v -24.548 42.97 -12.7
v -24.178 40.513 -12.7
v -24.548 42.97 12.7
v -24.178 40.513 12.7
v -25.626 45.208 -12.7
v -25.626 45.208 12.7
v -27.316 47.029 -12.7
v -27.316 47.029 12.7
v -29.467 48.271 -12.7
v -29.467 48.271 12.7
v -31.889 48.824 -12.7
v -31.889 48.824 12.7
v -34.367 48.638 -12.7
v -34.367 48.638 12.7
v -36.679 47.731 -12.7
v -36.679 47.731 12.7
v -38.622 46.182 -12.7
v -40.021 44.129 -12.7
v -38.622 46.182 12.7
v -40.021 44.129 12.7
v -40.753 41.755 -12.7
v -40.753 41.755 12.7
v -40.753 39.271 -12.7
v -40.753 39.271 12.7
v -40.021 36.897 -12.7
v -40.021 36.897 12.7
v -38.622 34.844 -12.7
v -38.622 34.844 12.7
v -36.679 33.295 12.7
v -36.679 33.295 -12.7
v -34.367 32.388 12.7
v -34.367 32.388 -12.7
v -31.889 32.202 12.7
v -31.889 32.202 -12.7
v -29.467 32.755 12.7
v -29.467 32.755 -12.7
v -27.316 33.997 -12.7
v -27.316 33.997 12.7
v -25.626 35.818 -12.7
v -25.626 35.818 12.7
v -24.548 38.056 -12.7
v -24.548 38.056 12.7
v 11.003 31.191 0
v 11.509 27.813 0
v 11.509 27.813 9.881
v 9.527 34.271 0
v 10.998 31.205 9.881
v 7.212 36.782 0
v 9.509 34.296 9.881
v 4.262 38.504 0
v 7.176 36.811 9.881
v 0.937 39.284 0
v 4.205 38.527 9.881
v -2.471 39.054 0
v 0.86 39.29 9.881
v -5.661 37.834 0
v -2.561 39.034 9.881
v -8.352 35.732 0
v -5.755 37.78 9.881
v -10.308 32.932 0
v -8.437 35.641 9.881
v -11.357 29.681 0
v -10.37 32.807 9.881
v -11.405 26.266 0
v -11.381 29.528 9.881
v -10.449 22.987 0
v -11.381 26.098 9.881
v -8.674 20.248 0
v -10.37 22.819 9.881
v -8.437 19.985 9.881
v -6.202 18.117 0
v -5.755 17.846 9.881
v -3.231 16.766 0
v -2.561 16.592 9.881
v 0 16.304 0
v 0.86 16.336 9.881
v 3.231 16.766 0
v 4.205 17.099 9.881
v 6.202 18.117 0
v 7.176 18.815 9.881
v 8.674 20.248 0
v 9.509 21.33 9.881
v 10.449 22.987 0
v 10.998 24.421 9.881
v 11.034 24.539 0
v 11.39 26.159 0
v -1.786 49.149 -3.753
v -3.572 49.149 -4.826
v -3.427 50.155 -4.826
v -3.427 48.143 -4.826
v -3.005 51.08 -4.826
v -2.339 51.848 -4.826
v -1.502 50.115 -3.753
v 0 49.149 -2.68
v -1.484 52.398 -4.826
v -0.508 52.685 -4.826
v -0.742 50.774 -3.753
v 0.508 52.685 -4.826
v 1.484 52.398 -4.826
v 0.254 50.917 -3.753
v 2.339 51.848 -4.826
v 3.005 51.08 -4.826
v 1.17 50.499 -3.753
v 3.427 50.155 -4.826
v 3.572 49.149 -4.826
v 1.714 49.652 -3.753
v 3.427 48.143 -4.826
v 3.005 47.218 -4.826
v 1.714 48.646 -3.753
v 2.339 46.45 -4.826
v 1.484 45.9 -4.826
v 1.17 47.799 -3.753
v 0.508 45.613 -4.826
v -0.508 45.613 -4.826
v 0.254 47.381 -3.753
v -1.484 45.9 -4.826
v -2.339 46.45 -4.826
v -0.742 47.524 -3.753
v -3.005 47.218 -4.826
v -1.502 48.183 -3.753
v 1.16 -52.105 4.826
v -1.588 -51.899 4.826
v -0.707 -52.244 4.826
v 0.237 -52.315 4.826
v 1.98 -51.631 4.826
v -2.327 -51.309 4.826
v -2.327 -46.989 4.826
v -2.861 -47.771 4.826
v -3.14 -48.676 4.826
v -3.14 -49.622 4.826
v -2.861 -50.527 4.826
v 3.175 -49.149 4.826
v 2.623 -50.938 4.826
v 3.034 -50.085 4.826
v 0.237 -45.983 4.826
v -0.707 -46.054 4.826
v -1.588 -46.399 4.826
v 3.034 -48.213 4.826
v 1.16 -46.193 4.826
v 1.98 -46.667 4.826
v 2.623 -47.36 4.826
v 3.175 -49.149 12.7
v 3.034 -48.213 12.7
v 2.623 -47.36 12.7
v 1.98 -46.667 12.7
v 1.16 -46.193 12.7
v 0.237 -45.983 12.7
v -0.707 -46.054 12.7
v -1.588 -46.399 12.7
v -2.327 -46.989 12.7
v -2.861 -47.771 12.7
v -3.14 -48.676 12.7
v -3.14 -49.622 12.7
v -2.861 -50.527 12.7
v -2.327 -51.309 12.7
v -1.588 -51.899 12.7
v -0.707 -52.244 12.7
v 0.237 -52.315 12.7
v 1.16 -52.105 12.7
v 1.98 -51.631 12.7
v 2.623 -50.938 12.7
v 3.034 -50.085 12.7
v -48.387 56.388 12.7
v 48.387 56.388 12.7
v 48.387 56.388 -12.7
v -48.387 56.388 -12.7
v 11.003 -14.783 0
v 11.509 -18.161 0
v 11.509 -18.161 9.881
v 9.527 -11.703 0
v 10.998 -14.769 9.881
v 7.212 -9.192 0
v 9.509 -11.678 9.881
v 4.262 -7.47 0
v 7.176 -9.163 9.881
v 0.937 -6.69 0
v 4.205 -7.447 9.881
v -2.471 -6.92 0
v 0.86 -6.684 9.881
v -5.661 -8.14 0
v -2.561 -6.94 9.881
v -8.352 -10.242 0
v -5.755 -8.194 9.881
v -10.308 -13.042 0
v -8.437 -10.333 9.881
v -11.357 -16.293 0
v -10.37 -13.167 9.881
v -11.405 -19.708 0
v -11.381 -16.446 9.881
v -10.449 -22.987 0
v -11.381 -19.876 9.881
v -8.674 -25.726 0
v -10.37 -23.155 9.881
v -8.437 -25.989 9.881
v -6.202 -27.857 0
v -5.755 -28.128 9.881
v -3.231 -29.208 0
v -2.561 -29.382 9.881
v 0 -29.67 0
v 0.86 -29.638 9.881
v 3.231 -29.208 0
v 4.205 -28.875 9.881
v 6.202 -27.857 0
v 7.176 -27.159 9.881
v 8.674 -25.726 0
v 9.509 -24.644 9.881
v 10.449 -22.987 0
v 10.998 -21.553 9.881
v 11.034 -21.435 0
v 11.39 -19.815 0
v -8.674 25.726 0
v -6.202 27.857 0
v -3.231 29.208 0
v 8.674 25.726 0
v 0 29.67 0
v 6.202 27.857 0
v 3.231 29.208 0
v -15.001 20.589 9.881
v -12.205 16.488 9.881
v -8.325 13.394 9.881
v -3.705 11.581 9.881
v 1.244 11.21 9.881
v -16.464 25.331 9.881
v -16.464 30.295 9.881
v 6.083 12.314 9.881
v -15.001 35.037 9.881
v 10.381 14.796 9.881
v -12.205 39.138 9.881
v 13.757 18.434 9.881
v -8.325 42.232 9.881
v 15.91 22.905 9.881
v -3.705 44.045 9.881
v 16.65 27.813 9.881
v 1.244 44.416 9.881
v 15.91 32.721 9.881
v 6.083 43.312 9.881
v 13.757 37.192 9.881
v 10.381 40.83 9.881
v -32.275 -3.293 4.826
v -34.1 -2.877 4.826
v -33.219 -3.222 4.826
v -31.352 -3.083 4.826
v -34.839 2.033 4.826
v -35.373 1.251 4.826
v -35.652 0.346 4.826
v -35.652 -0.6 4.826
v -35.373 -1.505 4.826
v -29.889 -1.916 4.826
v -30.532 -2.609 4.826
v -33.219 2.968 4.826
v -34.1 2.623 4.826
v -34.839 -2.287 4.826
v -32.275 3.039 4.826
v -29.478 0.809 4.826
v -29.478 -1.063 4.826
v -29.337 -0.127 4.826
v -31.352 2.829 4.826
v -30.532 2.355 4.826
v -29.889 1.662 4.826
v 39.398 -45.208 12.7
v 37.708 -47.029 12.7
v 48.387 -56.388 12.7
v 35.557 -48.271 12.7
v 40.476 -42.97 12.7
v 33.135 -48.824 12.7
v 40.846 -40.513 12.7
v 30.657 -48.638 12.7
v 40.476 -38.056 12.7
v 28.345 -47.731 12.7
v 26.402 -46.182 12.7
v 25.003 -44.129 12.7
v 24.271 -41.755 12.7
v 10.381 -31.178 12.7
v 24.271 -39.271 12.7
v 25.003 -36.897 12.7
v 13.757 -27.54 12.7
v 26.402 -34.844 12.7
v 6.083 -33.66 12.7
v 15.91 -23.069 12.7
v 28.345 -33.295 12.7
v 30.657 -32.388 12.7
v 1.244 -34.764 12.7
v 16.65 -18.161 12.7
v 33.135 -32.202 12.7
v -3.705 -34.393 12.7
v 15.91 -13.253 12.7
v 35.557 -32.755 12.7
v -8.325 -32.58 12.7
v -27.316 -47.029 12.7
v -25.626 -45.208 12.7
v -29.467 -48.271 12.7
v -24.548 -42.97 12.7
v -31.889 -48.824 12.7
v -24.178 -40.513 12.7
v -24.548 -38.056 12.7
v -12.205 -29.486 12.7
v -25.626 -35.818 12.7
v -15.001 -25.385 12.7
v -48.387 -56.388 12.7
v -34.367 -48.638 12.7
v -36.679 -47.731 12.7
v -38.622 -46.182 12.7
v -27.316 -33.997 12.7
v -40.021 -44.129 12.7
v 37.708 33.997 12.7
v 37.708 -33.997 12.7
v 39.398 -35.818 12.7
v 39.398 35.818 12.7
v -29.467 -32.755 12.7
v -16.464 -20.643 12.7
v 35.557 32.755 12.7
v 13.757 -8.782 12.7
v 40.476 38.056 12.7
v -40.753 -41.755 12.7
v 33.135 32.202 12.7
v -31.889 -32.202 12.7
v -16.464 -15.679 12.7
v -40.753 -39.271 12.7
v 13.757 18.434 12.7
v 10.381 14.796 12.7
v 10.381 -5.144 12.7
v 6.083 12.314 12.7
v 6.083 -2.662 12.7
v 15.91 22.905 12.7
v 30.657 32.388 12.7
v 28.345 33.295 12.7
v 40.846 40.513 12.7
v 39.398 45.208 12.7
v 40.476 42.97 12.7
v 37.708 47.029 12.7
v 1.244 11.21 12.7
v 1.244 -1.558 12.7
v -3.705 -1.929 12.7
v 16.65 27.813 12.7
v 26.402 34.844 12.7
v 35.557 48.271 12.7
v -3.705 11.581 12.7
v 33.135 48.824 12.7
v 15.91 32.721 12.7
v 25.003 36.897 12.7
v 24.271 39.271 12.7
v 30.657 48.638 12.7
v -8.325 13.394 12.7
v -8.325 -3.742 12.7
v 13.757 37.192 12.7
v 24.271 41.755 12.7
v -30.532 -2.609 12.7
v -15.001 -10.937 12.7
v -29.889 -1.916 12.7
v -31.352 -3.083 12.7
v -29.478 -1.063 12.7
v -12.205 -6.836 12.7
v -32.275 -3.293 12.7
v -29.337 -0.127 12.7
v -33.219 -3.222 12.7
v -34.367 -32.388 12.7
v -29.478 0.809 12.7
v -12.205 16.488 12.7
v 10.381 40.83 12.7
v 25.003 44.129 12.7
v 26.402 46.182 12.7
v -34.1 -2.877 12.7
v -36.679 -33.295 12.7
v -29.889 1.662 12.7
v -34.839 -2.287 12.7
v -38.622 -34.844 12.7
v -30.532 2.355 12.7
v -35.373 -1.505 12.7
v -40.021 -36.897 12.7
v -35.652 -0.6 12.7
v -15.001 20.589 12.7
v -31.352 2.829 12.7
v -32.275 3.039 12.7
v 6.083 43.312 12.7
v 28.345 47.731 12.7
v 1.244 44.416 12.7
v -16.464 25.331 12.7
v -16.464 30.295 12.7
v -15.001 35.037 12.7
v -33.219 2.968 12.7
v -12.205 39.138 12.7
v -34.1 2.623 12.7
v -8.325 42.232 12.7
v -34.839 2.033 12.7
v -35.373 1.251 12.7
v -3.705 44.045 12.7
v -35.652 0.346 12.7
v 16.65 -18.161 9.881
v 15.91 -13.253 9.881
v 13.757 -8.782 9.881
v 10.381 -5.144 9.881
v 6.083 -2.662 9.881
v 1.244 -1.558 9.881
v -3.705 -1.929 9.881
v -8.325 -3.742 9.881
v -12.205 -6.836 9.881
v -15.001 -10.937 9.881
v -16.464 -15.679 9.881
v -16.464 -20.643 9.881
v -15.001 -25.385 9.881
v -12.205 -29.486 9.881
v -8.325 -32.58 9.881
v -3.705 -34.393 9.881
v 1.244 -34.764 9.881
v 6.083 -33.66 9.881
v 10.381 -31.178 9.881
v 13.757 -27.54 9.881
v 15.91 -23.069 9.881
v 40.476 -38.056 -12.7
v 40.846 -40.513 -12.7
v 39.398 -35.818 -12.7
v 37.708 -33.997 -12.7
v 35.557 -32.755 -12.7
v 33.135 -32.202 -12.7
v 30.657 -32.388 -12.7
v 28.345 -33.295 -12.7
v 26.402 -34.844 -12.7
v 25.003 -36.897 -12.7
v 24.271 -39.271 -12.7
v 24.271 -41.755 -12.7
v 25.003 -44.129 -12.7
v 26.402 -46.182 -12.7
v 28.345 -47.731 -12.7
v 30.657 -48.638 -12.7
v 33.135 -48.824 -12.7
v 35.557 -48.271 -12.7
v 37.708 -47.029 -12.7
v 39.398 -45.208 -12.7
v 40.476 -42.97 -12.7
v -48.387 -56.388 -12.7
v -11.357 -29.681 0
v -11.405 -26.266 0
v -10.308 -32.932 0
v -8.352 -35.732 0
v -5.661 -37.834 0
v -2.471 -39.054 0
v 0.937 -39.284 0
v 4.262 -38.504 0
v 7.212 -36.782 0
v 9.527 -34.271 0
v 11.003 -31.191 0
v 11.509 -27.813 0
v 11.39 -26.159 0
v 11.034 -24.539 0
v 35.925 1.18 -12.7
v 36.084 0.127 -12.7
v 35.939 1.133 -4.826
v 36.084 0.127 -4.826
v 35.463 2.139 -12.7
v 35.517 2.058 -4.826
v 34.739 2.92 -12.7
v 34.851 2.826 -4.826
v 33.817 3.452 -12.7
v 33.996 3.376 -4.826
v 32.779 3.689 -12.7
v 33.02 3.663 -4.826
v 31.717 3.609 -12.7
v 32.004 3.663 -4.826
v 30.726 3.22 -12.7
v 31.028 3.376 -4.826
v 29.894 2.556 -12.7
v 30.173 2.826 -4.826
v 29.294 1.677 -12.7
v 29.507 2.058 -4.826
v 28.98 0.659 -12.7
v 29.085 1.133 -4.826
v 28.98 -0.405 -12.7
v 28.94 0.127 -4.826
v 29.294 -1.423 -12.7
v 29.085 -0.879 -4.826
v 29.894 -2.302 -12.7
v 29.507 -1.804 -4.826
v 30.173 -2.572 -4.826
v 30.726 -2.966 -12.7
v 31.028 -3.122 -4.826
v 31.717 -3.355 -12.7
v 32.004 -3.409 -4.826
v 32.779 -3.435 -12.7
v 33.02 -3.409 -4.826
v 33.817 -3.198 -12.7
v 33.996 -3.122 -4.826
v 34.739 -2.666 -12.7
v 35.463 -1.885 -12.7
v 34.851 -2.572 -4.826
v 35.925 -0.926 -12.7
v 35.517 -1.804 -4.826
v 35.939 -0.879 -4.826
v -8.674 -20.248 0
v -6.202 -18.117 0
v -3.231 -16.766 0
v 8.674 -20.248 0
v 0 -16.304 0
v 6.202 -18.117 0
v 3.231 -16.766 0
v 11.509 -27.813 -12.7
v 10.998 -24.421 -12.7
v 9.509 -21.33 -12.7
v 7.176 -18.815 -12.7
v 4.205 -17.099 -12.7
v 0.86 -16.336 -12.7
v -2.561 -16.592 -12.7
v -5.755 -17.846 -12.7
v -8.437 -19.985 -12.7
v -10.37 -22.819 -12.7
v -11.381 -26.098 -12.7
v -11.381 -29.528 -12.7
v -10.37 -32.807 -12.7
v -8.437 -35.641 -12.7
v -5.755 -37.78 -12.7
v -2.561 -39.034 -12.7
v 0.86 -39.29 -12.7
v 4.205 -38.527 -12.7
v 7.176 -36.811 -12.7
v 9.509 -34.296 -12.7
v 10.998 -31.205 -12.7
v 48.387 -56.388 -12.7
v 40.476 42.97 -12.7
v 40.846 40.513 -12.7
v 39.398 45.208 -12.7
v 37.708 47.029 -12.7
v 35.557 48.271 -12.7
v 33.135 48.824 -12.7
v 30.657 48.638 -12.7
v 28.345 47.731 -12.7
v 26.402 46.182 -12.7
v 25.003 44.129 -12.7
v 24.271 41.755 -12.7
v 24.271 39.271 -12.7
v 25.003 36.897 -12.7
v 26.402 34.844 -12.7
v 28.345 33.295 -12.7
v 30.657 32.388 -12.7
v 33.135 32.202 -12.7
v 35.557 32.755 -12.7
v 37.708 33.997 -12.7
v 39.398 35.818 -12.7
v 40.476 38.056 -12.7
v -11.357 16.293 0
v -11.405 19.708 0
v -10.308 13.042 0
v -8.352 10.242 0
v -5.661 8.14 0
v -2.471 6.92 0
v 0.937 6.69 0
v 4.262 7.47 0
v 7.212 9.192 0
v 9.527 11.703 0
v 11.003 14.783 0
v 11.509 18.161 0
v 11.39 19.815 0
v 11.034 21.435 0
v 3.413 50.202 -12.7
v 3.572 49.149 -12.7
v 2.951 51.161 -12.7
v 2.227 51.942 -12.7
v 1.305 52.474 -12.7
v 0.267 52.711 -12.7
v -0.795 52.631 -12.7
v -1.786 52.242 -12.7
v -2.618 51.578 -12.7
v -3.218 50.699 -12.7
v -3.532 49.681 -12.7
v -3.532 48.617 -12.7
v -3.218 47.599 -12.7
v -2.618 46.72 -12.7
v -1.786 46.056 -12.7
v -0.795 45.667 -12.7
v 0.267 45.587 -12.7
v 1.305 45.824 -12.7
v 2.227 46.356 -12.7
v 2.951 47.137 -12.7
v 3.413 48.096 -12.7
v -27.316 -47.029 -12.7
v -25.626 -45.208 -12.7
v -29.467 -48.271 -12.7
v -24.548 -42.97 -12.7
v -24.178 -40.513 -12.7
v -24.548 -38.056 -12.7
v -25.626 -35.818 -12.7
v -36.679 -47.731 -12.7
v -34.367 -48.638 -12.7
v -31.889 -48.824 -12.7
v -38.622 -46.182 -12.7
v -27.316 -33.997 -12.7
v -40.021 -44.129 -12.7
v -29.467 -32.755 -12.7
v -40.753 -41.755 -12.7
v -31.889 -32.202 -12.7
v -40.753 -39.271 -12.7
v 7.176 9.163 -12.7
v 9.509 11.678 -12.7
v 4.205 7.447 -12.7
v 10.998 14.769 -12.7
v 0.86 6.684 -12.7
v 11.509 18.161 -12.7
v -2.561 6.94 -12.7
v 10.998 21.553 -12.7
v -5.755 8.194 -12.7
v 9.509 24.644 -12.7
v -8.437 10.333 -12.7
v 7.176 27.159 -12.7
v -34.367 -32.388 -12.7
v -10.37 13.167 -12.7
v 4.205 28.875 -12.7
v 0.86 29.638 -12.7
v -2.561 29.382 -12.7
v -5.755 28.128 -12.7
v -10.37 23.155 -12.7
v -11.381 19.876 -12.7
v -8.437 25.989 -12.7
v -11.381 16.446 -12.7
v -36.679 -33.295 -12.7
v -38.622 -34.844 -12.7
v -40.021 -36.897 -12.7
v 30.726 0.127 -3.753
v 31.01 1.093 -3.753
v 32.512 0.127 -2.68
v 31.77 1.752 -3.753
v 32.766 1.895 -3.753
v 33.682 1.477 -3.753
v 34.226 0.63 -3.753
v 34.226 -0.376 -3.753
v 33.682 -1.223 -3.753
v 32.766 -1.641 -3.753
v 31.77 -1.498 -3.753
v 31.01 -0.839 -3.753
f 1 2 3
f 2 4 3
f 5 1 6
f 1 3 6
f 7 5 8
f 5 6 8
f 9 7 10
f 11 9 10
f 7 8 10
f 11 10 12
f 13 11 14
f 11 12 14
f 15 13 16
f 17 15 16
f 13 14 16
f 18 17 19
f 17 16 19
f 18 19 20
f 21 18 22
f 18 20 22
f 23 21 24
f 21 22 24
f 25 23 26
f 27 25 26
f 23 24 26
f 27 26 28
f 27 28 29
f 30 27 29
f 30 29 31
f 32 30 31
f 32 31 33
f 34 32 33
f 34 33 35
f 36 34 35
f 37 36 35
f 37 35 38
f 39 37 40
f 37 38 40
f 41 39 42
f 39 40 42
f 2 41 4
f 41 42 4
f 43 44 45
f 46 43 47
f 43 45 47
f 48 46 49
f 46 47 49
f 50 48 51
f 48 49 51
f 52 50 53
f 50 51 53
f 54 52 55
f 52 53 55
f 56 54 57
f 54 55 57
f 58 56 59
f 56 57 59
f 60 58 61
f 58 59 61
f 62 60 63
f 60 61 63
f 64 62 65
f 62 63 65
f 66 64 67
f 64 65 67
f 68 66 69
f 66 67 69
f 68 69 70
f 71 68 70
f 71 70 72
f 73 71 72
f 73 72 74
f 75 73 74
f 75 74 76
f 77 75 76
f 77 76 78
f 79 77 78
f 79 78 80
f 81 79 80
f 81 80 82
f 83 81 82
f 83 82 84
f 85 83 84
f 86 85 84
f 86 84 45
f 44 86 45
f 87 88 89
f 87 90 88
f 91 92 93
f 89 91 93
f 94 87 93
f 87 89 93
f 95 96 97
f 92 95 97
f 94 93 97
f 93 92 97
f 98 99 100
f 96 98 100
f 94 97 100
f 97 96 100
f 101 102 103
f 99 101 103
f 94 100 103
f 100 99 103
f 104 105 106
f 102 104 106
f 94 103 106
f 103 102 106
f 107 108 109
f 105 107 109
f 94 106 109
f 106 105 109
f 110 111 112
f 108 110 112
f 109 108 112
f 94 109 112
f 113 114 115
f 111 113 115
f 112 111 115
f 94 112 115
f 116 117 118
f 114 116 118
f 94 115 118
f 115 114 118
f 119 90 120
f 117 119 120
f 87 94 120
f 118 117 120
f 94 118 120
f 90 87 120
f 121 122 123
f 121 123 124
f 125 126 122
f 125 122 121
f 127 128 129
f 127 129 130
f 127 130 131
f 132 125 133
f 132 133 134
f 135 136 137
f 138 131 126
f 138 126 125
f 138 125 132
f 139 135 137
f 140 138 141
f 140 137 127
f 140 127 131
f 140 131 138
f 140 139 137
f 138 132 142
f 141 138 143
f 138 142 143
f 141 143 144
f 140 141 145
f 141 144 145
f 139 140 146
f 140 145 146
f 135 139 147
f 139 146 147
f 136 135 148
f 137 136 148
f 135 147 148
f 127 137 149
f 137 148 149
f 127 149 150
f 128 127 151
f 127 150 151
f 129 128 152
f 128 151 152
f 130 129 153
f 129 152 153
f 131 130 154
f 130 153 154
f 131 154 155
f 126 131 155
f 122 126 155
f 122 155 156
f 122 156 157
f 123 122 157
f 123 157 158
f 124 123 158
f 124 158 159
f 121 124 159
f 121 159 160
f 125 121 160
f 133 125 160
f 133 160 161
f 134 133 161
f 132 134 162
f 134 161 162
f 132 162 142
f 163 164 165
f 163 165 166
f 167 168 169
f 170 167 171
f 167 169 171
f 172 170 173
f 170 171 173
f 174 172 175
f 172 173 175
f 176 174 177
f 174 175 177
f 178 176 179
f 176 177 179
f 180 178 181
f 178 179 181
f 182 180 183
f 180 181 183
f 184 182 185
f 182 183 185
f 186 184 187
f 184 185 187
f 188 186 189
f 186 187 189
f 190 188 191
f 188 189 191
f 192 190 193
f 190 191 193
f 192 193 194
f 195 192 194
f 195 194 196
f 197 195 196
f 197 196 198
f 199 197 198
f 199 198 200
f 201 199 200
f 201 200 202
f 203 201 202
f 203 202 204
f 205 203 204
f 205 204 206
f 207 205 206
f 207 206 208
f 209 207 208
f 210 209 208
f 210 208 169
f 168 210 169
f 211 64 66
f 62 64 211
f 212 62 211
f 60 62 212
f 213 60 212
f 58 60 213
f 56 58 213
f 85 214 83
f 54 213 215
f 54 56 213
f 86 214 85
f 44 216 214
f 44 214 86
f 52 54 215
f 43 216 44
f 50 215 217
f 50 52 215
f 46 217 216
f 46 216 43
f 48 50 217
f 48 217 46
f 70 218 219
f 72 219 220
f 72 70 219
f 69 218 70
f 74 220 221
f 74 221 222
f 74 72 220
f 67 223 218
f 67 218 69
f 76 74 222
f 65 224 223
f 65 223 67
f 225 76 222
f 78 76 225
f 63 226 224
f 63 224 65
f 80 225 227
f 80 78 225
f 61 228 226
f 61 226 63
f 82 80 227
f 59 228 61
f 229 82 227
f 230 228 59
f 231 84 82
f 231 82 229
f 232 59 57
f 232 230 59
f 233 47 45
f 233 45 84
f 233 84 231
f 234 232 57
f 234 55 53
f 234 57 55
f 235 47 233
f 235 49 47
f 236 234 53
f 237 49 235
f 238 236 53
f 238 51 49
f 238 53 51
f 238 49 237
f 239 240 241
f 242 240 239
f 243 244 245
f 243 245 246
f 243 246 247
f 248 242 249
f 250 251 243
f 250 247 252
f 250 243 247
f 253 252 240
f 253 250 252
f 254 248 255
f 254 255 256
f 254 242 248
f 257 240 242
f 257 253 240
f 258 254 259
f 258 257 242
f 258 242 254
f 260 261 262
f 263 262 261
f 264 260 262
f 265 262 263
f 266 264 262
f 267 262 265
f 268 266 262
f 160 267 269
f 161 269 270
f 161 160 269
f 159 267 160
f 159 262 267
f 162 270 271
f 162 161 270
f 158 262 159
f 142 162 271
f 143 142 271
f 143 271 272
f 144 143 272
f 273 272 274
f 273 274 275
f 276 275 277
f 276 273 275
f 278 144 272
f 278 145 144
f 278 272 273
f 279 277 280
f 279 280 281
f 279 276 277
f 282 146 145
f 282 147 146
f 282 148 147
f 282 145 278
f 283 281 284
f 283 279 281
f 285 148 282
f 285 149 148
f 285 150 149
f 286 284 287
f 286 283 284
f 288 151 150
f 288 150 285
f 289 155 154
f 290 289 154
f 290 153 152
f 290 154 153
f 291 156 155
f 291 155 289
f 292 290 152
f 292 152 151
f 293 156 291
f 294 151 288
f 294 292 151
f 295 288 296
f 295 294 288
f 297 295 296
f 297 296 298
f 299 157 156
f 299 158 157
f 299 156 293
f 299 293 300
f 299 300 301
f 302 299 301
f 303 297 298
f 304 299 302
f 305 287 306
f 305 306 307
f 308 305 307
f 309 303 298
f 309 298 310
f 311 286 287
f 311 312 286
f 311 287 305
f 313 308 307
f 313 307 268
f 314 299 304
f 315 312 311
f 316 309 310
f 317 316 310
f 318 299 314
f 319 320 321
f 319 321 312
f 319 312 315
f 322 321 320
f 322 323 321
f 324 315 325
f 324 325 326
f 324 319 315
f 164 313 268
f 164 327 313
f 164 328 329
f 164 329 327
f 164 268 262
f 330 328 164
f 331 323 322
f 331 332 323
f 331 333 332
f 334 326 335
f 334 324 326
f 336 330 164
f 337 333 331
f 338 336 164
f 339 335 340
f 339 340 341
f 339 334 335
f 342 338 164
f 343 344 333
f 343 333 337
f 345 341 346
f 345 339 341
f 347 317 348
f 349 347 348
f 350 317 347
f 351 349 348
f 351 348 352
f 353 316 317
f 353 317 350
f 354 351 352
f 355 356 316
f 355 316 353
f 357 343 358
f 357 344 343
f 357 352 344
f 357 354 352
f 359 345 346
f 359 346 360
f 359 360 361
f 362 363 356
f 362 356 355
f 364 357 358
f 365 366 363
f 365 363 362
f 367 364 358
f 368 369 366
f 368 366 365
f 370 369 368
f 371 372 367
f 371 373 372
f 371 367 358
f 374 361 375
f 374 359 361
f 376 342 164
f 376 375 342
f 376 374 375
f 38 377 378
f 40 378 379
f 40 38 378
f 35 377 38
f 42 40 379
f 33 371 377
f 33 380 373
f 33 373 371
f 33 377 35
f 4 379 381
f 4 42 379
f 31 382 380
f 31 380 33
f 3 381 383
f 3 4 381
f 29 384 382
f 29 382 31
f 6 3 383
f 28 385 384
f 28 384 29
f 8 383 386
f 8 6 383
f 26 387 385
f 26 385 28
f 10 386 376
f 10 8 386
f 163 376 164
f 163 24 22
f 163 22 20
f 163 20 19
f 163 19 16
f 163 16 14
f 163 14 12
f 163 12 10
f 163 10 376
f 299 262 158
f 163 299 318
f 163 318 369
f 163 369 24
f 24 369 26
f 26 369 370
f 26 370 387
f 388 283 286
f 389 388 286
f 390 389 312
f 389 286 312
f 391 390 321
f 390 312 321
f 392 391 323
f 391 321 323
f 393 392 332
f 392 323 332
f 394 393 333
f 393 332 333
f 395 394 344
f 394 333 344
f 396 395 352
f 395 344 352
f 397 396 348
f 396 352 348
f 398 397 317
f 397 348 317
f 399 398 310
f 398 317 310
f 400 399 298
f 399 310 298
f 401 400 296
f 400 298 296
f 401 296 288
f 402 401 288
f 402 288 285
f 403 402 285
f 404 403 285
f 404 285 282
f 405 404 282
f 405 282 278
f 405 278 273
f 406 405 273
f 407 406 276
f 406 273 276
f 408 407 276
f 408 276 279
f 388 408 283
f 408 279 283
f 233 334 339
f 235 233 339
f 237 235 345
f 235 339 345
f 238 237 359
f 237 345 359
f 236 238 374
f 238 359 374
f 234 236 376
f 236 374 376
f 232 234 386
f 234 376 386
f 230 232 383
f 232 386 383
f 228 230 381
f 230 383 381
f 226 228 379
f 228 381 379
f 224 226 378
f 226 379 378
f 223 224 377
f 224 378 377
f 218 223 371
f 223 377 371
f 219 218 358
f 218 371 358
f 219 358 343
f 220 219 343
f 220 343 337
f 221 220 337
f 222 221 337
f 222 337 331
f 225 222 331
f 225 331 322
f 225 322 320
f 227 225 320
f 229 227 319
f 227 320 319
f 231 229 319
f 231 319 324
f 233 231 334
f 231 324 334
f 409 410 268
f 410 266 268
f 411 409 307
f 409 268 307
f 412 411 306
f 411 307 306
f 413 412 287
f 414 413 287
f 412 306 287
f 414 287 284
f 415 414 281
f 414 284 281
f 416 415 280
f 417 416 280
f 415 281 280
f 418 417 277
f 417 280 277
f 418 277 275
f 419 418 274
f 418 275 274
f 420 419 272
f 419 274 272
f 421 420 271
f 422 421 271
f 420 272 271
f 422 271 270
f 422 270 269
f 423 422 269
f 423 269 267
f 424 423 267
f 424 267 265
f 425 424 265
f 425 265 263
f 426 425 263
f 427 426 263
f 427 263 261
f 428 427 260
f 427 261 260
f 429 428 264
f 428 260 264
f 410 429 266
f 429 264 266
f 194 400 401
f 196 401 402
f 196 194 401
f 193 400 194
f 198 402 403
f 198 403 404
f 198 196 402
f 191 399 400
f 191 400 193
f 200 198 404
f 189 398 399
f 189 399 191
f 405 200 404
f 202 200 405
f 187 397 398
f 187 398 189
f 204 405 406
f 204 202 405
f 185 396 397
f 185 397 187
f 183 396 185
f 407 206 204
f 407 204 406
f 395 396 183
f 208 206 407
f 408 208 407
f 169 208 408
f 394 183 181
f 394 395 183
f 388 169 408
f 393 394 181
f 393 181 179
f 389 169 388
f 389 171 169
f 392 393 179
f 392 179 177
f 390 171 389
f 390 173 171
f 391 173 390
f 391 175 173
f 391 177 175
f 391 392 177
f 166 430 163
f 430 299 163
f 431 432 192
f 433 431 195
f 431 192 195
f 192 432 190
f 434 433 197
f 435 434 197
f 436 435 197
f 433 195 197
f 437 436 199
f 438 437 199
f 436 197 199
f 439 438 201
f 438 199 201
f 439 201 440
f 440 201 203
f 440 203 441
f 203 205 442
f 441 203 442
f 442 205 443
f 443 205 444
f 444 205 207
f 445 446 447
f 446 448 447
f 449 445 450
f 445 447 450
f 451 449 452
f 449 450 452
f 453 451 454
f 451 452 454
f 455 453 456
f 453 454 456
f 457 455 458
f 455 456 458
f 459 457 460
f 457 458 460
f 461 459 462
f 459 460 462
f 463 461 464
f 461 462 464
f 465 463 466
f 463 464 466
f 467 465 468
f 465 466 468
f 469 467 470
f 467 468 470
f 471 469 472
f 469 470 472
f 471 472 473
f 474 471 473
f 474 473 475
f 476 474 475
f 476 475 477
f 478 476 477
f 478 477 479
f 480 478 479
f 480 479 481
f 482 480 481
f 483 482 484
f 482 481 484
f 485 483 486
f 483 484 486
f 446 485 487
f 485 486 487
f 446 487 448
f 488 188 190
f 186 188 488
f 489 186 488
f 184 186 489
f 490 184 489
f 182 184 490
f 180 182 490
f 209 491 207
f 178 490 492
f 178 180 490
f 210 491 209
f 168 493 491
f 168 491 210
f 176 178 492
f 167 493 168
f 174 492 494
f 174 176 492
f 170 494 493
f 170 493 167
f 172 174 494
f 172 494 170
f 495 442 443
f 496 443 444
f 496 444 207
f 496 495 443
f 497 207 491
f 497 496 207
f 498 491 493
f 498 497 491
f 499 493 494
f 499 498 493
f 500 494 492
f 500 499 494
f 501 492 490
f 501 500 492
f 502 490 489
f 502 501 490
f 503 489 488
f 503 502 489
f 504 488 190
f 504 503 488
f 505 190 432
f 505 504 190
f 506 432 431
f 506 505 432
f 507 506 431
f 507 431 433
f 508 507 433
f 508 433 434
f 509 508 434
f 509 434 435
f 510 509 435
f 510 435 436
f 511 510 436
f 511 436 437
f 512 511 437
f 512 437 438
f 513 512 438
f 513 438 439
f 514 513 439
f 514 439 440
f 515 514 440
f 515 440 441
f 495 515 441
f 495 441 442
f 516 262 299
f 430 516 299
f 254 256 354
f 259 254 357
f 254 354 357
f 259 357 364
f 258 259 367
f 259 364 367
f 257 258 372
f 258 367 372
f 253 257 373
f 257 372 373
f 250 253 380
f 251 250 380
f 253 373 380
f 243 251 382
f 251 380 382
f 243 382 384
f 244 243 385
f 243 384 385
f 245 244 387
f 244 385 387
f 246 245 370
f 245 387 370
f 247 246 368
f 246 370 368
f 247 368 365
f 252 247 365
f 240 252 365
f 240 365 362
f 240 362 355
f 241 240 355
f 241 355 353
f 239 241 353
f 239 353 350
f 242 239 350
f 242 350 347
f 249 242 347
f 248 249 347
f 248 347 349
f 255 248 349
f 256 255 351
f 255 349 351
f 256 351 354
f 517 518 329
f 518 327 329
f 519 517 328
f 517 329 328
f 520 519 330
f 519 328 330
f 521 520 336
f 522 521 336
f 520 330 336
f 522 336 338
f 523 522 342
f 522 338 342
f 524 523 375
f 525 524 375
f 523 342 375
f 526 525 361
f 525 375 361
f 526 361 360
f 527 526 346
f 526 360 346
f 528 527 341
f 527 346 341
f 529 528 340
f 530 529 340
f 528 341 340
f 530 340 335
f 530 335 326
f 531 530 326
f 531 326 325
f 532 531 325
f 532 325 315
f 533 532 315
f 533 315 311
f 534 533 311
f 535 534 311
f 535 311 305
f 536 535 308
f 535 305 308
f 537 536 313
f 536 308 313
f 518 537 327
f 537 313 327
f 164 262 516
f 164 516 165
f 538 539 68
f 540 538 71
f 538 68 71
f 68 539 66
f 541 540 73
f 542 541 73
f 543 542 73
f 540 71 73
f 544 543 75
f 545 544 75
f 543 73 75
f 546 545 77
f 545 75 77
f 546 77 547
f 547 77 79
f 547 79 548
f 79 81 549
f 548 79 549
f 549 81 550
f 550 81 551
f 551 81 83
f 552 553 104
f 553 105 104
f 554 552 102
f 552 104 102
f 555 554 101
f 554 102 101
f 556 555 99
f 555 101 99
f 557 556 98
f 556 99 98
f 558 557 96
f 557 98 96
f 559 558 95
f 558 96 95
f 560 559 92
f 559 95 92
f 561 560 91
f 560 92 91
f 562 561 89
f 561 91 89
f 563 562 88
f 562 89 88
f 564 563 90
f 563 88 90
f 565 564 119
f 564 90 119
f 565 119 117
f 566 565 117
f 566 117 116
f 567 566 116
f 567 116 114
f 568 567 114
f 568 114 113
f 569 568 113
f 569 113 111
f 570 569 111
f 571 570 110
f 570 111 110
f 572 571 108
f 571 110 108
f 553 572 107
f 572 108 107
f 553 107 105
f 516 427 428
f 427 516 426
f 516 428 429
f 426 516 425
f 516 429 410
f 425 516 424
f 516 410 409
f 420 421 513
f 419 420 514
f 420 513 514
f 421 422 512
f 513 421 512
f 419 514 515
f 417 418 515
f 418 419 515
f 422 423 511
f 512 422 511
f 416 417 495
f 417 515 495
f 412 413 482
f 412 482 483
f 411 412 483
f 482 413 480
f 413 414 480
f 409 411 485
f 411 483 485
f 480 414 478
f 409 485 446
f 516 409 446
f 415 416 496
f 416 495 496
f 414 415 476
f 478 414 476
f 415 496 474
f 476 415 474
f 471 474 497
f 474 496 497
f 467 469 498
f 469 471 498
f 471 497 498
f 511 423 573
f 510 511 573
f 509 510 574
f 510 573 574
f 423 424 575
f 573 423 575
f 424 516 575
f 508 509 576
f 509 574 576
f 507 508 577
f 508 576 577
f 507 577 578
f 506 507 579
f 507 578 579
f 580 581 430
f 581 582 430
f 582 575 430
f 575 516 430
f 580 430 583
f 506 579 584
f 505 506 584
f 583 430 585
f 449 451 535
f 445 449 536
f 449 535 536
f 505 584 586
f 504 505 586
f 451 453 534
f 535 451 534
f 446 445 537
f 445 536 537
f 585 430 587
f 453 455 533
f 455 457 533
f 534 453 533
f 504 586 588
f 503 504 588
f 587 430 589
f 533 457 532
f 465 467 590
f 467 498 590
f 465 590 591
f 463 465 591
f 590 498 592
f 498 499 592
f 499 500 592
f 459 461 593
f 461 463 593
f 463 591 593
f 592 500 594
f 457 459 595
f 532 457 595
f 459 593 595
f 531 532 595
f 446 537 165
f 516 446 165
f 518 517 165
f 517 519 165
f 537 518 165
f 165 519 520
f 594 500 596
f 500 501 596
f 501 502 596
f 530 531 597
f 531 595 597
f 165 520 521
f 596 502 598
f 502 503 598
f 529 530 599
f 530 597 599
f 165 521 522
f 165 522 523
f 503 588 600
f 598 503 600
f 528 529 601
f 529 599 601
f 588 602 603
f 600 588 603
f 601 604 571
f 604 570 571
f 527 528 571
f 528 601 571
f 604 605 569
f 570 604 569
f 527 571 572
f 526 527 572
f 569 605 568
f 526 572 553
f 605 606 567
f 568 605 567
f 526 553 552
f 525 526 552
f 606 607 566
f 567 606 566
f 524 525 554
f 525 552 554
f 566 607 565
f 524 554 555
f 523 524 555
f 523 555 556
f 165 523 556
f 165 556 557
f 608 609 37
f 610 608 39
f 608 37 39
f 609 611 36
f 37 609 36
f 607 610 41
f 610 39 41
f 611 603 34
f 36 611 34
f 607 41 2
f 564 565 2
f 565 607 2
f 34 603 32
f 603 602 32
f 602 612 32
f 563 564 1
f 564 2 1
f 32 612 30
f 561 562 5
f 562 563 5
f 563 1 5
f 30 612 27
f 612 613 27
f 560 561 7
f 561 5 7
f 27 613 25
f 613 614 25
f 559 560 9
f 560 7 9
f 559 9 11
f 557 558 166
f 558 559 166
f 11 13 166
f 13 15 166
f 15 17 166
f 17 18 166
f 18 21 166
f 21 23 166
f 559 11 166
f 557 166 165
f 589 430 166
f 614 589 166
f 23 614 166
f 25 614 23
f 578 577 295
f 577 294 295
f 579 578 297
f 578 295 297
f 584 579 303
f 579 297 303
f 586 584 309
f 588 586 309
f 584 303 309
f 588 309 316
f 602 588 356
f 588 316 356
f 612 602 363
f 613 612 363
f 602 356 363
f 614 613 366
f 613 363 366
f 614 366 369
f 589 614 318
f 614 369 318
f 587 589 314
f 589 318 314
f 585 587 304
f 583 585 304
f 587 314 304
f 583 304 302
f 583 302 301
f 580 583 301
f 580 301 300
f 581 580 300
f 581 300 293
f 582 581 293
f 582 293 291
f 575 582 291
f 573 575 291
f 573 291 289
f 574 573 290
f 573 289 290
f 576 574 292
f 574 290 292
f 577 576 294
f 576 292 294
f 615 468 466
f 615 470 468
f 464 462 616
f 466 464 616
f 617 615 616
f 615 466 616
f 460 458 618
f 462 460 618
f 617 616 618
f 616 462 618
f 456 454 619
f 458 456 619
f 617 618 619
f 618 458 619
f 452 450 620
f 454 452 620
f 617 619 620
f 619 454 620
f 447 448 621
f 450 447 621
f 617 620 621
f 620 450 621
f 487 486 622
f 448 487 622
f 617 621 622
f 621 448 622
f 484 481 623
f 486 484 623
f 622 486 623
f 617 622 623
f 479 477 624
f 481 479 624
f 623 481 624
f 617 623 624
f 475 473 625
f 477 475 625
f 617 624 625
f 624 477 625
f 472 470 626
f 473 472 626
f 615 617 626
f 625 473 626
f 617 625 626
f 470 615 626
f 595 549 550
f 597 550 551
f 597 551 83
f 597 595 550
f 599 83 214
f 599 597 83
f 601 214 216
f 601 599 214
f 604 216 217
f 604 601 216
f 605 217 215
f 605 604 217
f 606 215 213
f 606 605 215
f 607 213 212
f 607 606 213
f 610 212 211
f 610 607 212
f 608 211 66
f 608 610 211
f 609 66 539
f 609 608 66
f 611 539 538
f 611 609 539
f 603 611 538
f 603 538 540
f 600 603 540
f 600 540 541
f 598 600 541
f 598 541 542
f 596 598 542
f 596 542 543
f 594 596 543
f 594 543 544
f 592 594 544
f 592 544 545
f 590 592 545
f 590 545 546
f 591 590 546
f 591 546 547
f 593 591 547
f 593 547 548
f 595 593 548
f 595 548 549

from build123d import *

# Parameters (mm, degrees)
SKETCH1_W                   = 112.776
SKETCH1_H                   = 96.774
BOSS_EXTRUDE1_DEPTH         = 12.7
F_5_8_CLEARANCE_HOLE1_D     = 16.66875
F_5_8_CLEARANCE_HOLE1_DEPTH = 25.4
F_5_8_CLEARANCE_HOLE1_TIP   = 5.007797722
CUT_EXTRUDE2_START          = -12.7
SKETCH4_R                   = 11.509375
CUT_EXTRUDE2_DEPTH          = 12.7
CUT_EXTRUDE4_START          = 12.7
SKETCH5_R                   = 11.509375
CUT_EXTRUDE4_DEPTH          = 12.7
CUT_EXTRUDE6_START          = 12.7
SKETCH6_R                   = 16.6497
CUT_EXTRUDE6_DEPTH          = 2.8194
F_1_4_CLEARANCE_HOLE2_D     = 7.14375
F_1_4_CLEARANCE_HOLE2_DEPTH = 7.874
F_1_4_CLEARANCE_HOLE2_TIP   = 2.146199024
CUT_EXTRUDE8_START          = 12.7
SKETCH11_R                  = 3.175
CUT_EXTRUDE8_DEPTH          = 7.874


with BuildPart() as part:
    # Sketch1 → Boss-Extrude1 (new, symmetric)
    with BuildSketch(Plane(origin=(0, 0, 0), x_dir=(0, 1, 0), z_dir=(0, 0, 1))):
        Rectangle(SKETCH1_W, SKETCH1_H)
    extrude(amount=BOSS_EXTRUDE1_DEPTH, both=True)

    # 5/8 Clearance Hole1
    with Locations(Plane(origin=(0, 0, -12.7), x_dir=(-1, 0, 0), z_dir=(0, 0, -1))):
        with Locations((-32.512, -40.513), (-32.512, 40.513), (32.512, -40.513), (32.512, 40.513)):
            Hole(F_5_8_CLEARANCE_HOLE1_D / 2, depth=F_5_8_CLEARANCE_HOLE1_DEPTH)
            with Locations((0, 0, -(F_5_8_CLEARANCE_HOLE1_DEPTH + F_5_8_CLEARANCE_HOLE1_TIP / 2))):  # 118° drill point
                Cone(0, F_5_8_CLEARANCE_HOLE1_D / 2, F_5_8_CLEARANCE_HOLE1_TIP, mode=Mode.SUBTRACT)

    # Sketch4 → Cut-Extrude2 (cut)
    with BuildSketch(Plane(origin=(0, 0, 0), x_dir=(0, 1, 0), z_dir=(0, 0, 1)).offset(CUT_EXTRUDE2_START)):
        with Locations(Location((-27.813, 0, 0), (0, 0, 270))):
            Circle(SKETCH4_R)
        with Locations(Location((18.161, 0, 0), (0, 0, 270))):
            Circle(SKETCH4_R)
    extrude(amount=CUT_EXTRUDE2_DEPTH, mode=Mode.SUBTRACT)

    # Sketch5 → Cut-Extrude4 (cut)
    with BuildSketch(Plane(origin=(0, 0, 0), x_dir=(0, 1, 0), z_dir=(0, 0, 1)).offset(CUT_EXTRUDE4_START)):
        with Locations(Location((-18.161, 0, 0), (0, 0, 270))):
            Circle(SKETCH5_R)
        with Locations(Location((27.813, 0, 0), (0, 0, 270))):
            Circle(SKETCH5_R)
    extrude(amount=-CUT_EXTRUDE4_DEPTH, mode=Mode.SUBTRACT)

    # Sketch6 → Cut-Extrude6 (cut)
    with BuildSketch(Plane(origin=(0, 0, 0), x_dir=(0, 1, 0), z_dir=(0, 0, 1)).offset(CUT_EXTRUDE6_START)):
        with Locations(Location((-18.161, 0, 0), (0, 0, 270))):
            Circle(SKETCH6_R)
        with Locations(Location((27.813, 0, 0), (0, 0, 270))):
            Circle(SKETCH6_R)
    extrude(amount=-CUT_EXTRUDE6_DEPTH, mode=Mode.SUBTRACT)

    # 1/4 Clearance Hole2
    with Locations(Plane(origin=(0, 0, -12.7), x_dir=(-1, 0, 0), z_dir=(0, 0, -1))):
        with Locations((0, 49.149), (-32.512, 0.127)):
            Hole(F_1_4_CLEARANCE_HOLE2_D / 2, depth=F_1_4_CLEARANCE_HOLE2_DEPTH)
            with Locations((0, 0, -(F_1_4_CLEARANCE_HOLE2_DEPTH + F_1_4_CLEARANCE_HOLE2_TIP / 2))):  # 118° drill point
                Cone(0, F_1_4_CLEARANCE_HOLE2_D / 2, F_1_4_CLEARANCE_HOLE2_TIP, mode=Mode.SUBTRACT)

    # Sketch11 → Cut-Extrude8 (cut)
    with BuildSketch(Plane(origin=(0, 0, 0), x_dir=(0, 1, 0), z_dir=(0, 0, 1)).offset(CUT_EXTRUDE8_START)):
        with Locations(Location((-49.149, 0, 0), (0, 0, 270))):
            Circle(SKETCH11_R)
        with Locations(Location((-0.127, 32.512, 0), (0, 0, 270))):
            Circle(SKETCH11_R)
    extrude(amount=-CUT_EXTRUDE8_DEPTH, mode=Mode.SUBTRACT)


solid = part.part
